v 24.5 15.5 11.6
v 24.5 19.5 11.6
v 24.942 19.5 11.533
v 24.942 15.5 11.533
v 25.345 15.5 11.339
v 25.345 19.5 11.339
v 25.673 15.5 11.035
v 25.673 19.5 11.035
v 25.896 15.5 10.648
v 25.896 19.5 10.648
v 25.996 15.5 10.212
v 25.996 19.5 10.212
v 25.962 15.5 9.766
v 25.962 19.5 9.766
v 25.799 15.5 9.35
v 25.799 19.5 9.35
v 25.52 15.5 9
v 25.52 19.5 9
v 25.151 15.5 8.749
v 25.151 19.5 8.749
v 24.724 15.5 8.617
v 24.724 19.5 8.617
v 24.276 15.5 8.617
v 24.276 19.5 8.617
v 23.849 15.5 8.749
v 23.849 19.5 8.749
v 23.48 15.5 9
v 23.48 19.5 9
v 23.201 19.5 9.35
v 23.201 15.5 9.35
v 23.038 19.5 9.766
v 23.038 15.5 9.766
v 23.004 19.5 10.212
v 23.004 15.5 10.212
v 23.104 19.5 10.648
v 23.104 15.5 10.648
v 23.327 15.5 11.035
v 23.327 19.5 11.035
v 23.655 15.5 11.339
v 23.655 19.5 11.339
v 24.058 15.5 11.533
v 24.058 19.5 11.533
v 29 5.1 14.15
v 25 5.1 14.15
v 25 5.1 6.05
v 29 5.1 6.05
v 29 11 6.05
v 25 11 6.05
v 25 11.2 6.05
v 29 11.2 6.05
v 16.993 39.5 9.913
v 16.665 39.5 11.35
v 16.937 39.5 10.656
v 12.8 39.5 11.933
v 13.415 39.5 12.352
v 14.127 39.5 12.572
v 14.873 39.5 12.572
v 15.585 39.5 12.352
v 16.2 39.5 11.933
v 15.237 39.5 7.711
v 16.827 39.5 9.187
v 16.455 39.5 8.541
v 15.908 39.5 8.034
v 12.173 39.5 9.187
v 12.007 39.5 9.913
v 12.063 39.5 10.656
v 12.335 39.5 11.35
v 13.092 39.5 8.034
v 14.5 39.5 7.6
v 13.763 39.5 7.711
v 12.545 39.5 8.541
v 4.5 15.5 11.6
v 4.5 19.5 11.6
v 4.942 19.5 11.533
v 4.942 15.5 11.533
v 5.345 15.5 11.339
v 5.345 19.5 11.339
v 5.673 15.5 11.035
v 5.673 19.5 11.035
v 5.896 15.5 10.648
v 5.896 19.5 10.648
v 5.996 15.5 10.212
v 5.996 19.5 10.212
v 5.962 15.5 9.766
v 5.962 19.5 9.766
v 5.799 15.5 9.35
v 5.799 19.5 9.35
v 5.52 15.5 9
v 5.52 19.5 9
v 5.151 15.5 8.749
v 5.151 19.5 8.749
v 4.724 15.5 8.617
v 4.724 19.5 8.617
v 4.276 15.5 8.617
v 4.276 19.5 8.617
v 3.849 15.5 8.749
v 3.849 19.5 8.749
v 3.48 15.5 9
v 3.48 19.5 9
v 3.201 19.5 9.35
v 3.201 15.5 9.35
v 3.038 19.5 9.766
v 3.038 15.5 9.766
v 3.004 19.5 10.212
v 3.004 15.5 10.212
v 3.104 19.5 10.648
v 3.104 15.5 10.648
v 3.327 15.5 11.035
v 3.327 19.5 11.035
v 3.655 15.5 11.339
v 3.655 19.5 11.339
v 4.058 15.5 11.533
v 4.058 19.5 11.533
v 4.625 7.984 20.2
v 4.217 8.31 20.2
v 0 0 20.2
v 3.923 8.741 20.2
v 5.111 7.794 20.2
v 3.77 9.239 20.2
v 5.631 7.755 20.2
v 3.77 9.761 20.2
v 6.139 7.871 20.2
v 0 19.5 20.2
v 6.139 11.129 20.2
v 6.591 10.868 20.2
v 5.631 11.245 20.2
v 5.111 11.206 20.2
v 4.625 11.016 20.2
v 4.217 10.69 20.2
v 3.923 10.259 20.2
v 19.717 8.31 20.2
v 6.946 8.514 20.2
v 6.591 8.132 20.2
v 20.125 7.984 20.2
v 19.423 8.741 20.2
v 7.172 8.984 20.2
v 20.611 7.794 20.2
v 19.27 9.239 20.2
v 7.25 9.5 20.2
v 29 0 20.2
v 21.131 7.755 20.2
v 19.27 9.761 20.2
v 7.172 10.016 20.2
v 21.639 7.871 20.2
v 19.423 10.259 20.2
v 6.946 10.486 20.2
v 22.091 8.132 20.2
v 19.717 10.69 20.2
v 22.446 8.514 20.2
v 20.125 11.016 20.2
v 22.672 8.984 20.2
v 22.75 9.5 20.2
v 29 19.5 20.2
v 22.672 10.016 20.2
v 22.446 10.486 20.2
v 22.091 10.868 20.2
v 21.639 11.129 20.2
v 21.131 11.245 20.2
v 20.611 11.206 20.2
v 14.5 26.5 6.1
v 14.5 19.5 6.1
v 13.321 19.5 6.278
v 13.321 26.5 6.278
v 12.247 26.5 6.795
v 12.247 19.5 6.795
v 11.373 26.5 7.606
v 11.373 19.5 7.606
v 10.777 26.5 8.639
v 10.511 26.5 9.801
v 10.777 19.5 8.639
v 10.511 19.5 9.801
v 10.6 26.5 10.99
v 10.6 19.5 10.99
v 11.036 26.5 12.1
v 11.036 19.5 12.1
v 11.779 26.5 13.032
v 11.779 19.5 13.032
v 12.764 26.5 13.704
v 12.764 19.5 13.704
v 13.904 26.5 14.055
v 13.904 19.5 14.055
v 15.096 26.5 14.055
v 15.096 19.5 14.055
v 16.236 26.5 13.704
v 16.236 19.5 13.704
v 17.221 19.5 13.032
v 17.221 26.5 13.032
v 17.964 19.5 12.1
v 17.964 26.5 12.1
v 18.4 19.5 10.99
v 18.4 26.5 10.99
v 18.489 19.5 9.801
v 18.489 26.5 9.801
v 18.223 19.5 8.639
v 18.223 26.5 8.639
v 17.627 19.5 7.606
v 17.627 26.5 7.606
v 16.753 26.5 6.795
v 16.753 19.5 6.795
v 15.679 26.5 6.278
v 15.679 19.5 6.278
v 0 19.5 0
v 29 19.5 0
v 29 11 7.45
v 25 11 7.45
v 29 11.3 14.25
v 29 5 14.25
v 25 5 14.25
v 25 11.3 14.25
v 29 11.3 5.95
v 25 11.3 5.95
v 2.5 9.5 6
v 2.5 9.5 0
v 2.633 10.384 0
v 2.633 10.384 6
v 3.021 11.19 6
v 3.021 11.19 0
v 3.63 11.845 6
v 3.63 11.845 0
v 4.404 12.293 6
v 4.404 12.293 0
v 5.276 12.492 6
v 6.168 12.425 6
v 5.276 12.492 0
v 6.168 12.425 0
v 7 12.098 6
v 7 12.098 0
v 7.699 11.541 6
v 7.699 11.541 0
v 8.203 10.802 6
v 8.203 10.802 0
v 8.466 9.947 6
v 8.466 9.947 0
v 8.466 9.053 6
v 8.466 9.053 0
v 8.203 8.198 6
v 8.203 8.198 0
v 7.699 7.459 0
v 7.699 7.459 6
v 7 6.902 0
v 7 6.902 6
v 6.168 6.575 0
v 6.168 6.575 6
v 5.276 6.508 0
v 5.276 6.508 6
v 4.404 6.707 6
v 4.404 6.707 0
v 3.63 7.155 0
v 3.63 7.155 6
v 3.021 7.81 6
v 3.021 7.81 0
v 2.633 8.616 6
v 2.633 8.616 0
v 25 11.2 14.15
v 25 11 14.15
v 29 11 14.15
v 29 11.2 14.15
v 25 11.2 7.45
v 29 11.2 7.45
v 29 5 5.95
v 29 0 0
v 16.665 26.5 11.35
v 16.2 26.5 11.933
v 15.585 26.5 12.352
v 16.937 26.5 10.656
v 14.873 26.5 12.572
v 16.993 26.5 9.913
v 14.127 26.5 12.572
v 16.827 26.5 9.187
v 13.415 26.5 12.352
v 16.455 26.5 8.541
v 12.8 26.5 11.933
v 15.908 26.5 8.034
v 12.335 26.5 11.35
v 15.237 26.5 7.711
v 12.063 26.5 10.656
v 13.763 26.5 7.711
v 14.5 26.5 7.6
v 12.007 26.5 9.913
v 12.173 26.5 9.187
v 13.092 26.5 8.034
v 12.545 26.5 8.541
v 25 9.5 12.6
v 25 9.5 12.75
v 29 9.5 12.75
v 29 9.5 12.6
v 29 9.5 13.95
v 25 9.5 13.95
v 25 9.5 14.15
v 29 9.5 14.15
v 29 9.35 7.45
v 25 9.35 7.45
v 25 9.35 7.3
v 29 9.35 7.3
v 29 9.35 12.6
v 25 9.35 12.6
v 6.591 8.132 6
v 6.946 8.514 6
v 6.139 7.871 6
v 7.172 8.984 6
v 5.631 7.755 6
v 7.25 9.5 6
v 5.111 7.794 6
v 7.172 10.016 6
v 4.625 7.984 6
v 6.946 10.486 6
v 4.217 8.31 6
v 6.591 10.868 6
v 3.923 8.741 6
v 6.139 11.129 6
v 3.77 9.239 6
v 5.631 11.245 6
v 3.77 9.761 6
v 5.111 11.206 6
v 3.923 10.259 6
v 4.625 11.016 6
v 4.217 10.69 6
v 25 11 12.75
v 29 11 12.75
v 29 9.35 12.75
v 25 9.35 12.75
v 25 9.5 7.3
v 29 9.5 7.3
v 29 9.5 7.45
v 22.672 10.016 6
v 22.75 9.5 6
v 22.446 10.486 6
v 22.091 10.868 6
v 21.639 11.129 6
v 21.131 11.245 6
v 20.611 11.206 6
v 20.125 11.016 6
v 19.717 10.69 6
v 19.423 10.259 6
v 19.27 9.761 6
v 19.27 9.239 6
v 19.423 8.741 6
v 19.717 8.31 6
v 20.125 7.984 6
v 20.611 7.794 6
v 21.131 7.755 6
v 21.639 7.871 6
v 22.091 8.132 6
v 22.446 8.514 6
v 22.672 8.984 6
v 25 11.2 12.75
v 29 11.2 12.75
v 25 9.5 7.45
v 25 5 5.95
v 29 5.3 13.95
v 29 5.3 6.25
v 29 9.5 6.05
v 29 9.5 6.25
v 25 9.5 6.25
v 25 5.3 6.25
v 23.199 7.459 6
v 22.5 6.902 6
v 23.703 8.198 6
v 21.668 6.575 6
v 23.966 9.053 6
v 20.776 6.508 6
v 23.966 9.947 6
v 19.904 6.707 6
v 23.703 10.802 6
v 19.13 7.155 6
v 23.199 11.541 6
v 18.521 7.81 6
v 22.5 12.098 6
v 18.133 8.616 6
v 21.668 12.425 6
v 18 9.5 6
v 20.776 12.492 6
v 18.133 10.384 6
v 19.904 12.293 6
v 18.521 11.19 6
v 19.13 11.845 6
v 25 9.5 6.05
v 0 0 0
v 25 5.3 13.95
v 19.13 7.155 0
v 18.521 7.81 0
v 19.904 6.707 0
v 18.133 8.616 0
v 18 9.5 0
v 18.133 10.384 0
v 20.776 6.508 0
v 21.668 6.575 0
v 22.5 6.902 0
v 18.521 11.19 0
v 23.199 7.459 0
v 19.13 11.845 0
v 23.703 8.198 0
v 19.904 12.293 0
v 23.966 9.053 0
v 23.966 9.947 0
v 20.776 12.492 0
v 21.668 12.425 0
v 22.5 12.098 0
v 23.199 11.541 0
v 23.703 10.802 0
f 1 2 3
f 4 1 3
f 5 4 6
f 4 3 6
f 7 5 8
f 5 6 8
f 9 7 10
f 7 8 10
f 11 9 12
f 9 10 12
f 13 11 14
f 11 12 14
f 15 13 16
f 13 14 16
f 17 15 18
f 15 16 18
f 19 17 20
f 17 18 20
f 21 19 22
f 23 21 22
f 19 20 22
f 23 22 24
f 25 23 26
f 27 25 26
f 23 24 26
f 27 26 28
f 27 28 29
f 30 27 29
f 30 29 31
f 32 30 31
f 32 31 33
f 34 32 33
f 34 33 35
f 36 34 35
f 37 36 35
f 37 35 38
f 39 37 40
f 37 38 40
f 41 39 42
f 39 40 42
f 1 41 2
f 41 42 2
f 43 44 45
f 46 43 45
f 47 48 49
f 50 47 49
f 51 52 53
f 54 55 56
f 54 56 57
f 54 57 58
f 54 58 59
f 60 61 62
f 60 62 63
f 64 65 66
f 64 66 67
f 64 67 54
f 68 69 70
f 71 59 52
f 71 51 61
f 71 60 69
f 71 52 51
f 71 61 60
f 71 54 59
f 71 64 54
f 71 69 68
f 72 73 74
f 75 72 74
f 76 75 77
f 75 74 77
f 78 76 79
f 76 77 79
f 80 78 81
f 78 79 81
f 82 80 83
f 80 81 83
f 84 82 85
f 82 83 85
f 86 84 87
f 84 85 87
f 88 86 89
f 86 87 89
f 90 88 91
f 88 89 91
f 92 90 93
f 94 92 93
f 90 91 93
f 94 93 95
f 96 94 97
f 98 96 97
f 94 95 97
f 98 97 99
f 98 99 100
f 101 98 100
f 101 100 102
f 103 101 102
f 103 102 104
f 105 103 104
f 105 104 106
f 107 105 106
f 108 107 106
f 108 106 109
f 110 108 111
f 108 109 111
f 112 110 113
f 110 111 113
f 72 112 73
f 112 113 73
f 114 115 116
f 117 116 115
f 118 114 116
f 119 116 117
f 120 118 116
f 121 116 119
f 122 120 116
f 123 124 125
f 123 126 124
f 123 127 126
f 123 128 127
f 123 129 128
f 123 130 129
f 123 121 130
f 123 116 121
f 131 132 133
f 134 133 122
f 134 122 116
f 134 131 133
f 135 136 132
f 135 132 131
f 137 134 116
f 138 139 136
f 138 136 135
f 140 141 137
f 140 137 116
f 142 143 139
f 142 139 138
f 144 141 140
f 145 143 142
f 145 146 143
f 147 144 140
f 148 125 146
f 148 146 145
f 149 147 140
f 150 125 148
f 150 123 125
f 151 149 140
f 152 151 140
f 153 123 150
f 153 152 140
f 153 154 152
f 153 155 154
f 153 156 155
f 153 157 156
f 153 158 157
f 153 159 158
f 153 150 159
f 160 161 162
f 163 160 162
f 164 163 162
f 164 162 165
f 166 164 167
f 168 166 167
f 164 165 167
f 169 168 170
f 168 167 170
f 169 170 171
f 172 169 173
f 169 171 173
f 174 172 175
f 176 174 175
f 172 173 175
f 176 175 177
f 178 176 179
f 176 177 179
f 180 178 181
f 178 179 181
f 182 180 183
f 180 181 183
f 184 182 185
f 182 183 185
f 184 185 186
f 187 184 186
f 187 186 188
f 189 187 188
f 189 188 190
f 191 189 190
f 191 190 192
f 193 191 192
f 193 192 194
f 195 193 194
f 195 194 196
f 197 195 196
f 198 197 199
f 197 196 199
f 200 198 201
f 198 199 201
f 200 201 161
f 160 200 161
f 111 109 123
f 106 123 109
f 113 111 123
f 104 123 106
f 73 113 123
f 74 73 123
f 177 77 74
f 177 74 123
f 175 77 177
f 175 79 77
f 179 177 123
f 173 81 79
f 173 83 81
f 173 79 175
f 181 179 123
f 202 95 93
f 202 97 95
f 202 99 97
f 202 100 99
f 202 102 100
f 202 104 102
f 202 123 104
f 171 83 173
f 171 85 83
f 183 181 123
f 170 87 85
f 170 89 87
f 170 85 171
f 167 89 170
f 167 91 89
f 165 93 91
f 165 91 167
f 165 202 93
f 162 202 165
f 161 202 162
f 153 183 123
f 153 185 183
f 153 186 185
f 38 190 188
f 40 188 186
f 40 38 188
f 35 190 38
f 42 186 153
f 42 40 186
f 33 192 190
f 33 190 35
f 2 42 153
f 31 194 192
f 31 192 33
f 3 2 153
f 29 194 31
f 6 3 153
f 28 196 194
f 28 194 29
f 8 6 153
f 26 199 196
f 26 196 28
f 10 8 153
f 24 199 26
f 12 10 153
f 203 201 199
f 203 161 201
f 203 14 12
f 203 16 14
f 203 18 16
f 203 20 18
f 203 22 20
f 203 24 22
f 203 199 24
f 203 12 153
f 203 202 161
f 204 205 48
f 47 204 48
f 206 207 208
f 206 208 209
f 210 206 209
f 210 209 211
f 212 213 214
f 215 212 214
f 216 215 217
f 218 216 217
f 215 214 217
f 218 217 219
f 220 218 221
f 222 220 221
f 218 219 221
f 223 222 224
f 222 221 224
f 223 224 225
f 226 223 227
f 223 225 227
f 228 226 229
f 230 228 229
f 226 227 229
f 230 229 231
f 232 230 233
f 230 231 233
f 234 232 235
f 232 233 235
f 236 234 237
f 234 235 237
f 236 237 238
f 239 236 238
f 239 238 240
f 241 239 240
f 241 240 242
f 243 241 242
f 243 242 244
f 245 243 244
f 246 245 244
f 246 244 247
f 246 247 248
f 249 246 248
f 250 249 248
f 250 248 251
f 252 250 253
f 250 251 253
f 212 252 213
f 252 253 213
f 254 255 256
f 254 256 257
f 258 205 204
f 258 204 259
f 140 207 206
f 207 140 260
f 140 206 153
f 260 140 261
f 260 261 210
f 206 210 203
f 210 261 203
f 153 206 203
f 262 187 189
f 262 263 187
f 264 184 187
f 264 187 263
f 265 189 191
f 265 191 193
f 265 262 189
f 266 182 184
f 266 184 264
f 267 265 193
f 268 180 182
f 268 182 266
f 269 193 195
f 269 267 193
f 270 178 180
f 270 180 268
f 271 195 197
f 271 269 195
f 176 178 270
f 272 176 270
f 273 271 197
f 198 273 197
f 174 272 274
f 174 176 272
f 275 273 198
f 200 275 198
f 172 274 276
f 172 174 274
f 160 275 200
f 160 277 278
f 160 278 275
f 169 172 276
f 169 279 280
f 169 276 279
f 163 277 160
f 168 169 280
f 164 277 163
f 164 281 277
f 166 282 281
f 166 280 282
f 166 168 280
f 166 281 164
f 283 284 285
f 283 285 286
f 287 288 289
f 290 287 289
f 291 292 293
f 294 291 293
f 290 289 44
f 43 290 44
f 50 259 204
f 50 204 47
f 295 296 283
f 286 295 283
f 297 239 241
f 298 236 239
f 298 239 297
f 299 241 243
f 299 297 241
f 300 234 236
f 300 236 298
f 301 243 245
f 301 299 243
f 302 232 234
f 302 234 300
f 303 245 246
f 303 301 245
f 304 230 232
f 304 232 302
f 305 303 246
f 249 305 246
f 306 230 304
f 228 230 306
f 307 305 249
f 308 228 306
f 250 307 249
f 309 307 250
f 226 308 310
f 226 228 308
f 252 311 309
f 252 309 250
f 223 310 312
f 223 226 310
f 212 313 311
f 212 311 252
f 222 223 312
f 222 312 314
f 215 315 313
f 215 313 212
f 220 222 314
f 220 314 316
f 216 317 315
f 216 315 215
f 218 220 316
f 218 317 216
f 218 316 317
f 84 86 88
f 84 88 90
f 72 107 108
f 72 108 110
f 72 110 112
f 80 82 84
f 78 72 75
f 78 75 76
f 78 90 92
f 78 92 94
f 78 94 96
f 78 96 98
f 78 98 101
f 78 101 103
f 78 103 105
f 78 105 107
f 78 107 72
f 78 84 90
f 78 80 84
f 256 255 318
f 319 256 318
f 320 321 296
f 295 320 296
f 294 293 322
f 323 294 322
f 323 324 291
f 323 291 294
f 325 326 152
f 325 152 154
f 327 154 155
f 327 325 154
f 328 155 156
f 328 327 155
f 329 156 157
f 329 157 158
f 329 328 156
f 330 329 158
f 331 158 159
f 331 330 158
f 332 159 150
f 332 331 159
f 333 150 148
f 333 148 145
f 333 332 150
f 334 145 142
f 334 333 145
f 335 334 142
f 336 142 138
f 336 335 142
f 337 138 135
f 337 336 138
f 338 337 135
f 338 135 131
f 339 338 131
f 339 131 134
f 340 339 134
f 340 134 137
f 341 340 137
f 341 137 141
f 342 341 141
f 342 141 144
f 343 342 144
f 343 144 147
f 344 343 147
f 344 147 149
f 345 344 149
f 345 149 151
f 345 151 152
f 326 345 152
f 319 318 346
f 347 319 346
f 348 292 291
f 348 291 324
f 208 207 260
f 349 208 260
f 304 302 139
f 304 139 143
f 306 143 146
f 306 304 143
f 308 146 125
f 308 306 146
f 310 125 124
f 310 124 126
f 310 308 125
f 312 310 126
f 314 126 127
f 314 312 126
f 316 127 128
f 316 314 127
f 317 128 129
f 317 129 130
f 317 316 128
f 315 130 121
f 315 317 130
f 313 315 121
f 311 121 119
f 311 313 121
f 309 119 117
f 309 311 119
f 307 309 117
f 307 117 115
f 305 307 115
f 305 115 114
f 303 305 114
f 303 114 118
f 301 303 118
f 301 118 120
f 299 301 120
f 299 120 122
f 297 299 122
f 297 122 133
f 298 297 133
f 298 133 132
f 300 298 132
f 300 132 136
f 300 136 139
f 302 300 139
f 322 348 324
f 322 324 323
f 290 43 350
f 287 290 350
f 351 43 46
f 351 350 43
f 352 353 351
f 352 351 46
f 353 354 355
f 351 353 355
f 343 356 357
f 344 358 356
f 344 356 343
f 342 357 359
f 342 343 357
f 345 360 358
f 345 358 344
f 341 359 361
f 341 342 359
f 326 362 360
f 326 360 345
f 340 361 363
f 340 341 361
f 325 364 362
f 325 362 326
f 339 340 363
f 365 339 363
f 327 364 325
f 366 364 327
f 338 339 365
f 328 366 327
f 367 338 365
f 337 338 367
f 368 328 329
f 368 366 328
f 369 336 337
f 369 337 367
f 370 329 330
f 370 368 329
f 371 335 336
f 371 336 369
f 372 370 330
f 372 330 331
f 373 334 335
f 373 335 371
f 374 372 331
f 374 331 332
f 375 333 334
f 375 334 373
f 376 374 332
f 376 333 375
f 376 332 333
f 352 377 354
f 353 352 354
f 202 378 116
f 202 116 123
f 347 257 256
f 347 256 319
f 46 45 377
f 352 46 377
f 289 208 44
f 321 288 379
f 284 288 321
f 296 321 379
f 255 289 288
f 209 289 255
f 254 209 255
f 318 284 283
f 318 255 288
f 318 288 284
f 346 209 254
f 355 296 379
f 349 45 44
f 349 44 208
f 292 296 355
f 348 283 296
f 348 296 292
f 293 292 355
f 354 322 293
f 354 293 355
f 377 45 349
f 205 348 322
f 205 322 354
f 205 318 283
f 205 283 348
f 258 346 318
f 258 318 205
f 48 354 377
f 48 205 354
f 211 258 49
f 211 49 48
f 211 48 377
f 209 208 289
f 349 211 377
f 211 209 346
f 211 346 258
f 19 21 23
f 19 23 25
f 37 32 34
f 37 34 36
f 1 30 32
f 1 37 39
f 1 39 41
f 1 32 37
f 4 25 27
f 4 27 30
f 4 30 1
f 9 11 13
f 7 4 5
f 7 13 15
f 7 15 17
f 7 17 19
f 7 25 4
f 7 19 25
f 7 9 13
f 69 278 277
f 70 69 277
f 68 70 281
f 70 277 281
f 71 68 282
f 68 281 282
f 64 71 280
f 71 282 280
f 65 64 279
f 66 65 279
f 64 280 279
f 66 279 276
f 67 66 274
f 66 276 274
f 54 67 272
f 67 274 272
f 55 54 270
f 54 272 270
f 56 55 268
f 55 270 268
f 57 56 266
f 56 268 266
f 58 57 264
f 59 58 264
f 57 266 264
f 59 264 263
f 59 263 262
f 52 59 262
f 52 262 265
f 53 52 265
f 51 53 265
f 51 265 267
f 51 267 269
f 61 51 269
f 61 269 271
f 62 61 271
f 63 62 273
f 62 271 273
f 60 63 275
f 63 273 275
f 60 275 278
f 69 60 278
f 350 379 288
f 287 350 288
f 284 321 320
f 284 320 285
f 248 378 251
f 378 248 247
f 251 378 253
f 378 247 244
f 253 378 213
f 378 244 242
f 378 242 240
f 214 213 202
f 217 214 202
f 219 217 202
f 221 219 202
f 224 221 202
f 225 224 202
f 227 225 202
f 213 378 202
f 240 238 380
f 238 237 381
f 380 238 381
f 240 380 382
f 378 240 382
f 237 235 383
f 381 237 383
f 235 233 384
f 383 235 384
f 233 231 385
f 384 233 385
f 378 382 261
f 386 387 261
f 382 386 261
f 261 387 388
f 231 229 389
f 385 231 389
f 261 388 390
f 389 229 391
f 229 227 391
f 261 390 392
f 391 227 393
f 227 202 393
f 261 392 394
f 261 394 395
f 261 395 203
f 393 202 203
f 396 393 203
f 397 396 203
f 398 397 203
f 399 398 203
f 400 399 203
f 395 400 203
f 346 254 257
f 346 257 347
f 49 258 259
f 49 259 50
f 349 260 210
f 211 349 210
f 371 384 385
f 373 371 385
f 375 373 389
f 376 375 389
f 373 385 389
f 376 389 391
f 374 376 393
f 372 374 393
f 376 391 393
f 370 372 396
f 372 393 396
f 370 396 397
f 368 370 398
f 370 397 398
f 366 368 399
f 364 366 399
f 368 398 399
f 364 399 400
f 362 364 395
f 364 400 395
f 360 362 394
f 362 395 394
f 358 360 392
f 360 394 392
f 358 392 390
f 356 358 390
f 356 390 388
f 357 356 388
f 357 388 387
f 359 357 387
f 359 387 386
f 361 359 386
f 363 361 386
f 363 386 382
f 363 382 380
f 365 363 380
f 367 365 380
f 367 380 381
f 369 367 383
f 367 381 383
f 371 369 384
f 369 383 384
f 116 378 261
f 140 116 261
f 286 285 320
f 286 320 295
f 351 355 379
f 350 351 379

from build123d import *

# Parameters (mm, degrees)
SKETCH1_W                              = 29
SKETCH1_H                              = 19.5
SKETCH1_R                              = 1.75
FRONTPROFILEBOSS_EXTRUDE1_DEPTH        = 20.2
SKETCH2_R                              = 1.5
TOPMOUNTINGHOLESCUT_EXTRUDE1_DEPTH     = 4
SKETCH3_R                              = 4
CONNINGTOWERBOSS_EXTRUDE2_DEPTH        = 7
SKETCH4_R                              = 2.5
PLUNGERBOSS_EXTRUDE3_DEPTH             = 13
SKETCH5_R                              = 3
BACKMOUNTINGHOLESBORCUT_EXTRUDE2_DEPTH = 6
SKETCH6_W                              = 8.3
SKETCH6_H                              = 6.3
XHTERMINALCUT_EXTRUDE14_DEPTH          = 4
SKETCH7_W                              = 1.4
SKETCH7_H                              = 0.2
SKETCH7_W_2                            = 0.15
SKETCH7_H_2                            = 0.15
XHTERMINALBOSS_EXTRUDE4_DEPTH          = 4


with BuildPart() as part:
    # Sketch1 → FrontProfileBoss-Extrude1 (new body)
    with BuildSketch(Plane.XY):
        with Locations((14.5, 9.75)):
            Rectangle(SKETCH1_W, SKETCH1_H)
        with Locations((5.5, 9.5)):
            Circle(SKETCH1_R, mode=Mode.SUBTRACT)
        with Locations((21, 9.5)):
            Circle(SKETCH1_R, mode=Mode.SUBTRACT)
    extrude(amount=FRONTPROFILEBOSS_EXTRUDE1_DEPTH)

    # Sketch2 → TopMountingHolesCut-Extrude1 (cut)
    with BuildSketch(Plane(origin=(0, 19.5, 0), x_dir=(1, 0, 0), z_dir=(0, 1, 0))):
        with Locations(Location((4.5, -10.1, 0), (0, 0, 270))):
            Circle(SKETCH2_R)
        with Locations(Location((24.5, -10.1, 0), (0, 0, 270))):
            Circle(SKETCH2_R)
    extrude(amount=-TOPMOUNTINGHOLESCUT_EXTRUDE1_DEPTH, mode=Mode.SUBTRACT)

    # Sketch3 → ConningTowerBoss-Extrude2 (add)
    with BuildSketch(Plane(origin=(0, 19.5, 0), x_dir=(1, 0, 0), z_dir=(0, 1, 0))):
        with Locations(Location((14.5, -10.1, 0), (0, 0, 90))):
            Circle(SKETCH3_R)
    extrude(amount=CONNINGTOWERBOSS_EXTRUDE2_DEPTH)

    # Sketch4 → PlungerBoss-Extrude3 (add)
    with BuildSketch(Plane(origin=(0, 26.5, 0), x_dir=(1, 0, 0), z_dir=(0, 1, 0))):
        with Locations(Location((14.5, -10.1, 0), (0, 0, 90))):
            Circle(SKETCH4_R)
    extrude(amount=PLUNGERBOSS_EXTRUDE3_DEPTH)

    # Sketch5 → BackMountingHolesBorCut-Extrude2 (cut)
    with BuildSketch(Plane(origin=(0, 0, 0), x_dir=(-1, 0, 0), z_dir=(0, 0, -1))):
        with Locations((-21, 9.5)):
            Circle(SKETCH5_R)
        with Locations((-5.5, 9.5)):
            Circle(SKETCH5_R)
    extrude(amount=-BACKMOUNTINGHOLESBORCUT_EXTRUDE2_DEPTH, mode=Mode.SUBTRACT)

    # Sketch6 → XHTerminalCut-Extrude14 (cut)
    with BuildSketch(Plane(origin=(29, 0, 0), x_dir=(0, 0, -1), z_dir=(1, 0, 0))):
        with Locations((-10.1, 8.15)):
            Rectangle(SKETCH6_W, SKETCH6_H)
    extrude(amount=-XHTERMINALCUT_EXTRUDE14_DEPTH, mode=Mode.SUBTRACT)

    # Sketch7 → XHTerminalBoss-Extrude4 (add)
    with BuildSketch(Plane(origin=(25, 0, 0), x_dir=(0, 0, -1), z_dir=(1, 0, 0))):
        Polygon((-14.15, 9.5), (-14.15, 5.1), (-6.05, 5.1), (-6.05, 9.5), (-6.25, 9.5), (-6.25, 5.3), (-13.95, 5.3), (-13.95, 9.5), align=None)
        with Locations((-13.45, 11.1)):
            Rectangle(SKETCH7_W, SKETCH7_H)
        with Locations((-6.75, 11.1)):
            Rectangle(SKETCH7_W, SKETCH7_H)
        with Locations((-12.675, 9.425)):
            Rectangle(SKETCH7_W_2, SKETCH7_H_2)
        with Locations((-7.375, 9.425)):
            Rectangle(SKETCH7_W_2, SKETCH7_H_2)
    extrude(amount=XHTERMINALBOSS_EXTRUDE4_DEPTH)


solid = part.part
